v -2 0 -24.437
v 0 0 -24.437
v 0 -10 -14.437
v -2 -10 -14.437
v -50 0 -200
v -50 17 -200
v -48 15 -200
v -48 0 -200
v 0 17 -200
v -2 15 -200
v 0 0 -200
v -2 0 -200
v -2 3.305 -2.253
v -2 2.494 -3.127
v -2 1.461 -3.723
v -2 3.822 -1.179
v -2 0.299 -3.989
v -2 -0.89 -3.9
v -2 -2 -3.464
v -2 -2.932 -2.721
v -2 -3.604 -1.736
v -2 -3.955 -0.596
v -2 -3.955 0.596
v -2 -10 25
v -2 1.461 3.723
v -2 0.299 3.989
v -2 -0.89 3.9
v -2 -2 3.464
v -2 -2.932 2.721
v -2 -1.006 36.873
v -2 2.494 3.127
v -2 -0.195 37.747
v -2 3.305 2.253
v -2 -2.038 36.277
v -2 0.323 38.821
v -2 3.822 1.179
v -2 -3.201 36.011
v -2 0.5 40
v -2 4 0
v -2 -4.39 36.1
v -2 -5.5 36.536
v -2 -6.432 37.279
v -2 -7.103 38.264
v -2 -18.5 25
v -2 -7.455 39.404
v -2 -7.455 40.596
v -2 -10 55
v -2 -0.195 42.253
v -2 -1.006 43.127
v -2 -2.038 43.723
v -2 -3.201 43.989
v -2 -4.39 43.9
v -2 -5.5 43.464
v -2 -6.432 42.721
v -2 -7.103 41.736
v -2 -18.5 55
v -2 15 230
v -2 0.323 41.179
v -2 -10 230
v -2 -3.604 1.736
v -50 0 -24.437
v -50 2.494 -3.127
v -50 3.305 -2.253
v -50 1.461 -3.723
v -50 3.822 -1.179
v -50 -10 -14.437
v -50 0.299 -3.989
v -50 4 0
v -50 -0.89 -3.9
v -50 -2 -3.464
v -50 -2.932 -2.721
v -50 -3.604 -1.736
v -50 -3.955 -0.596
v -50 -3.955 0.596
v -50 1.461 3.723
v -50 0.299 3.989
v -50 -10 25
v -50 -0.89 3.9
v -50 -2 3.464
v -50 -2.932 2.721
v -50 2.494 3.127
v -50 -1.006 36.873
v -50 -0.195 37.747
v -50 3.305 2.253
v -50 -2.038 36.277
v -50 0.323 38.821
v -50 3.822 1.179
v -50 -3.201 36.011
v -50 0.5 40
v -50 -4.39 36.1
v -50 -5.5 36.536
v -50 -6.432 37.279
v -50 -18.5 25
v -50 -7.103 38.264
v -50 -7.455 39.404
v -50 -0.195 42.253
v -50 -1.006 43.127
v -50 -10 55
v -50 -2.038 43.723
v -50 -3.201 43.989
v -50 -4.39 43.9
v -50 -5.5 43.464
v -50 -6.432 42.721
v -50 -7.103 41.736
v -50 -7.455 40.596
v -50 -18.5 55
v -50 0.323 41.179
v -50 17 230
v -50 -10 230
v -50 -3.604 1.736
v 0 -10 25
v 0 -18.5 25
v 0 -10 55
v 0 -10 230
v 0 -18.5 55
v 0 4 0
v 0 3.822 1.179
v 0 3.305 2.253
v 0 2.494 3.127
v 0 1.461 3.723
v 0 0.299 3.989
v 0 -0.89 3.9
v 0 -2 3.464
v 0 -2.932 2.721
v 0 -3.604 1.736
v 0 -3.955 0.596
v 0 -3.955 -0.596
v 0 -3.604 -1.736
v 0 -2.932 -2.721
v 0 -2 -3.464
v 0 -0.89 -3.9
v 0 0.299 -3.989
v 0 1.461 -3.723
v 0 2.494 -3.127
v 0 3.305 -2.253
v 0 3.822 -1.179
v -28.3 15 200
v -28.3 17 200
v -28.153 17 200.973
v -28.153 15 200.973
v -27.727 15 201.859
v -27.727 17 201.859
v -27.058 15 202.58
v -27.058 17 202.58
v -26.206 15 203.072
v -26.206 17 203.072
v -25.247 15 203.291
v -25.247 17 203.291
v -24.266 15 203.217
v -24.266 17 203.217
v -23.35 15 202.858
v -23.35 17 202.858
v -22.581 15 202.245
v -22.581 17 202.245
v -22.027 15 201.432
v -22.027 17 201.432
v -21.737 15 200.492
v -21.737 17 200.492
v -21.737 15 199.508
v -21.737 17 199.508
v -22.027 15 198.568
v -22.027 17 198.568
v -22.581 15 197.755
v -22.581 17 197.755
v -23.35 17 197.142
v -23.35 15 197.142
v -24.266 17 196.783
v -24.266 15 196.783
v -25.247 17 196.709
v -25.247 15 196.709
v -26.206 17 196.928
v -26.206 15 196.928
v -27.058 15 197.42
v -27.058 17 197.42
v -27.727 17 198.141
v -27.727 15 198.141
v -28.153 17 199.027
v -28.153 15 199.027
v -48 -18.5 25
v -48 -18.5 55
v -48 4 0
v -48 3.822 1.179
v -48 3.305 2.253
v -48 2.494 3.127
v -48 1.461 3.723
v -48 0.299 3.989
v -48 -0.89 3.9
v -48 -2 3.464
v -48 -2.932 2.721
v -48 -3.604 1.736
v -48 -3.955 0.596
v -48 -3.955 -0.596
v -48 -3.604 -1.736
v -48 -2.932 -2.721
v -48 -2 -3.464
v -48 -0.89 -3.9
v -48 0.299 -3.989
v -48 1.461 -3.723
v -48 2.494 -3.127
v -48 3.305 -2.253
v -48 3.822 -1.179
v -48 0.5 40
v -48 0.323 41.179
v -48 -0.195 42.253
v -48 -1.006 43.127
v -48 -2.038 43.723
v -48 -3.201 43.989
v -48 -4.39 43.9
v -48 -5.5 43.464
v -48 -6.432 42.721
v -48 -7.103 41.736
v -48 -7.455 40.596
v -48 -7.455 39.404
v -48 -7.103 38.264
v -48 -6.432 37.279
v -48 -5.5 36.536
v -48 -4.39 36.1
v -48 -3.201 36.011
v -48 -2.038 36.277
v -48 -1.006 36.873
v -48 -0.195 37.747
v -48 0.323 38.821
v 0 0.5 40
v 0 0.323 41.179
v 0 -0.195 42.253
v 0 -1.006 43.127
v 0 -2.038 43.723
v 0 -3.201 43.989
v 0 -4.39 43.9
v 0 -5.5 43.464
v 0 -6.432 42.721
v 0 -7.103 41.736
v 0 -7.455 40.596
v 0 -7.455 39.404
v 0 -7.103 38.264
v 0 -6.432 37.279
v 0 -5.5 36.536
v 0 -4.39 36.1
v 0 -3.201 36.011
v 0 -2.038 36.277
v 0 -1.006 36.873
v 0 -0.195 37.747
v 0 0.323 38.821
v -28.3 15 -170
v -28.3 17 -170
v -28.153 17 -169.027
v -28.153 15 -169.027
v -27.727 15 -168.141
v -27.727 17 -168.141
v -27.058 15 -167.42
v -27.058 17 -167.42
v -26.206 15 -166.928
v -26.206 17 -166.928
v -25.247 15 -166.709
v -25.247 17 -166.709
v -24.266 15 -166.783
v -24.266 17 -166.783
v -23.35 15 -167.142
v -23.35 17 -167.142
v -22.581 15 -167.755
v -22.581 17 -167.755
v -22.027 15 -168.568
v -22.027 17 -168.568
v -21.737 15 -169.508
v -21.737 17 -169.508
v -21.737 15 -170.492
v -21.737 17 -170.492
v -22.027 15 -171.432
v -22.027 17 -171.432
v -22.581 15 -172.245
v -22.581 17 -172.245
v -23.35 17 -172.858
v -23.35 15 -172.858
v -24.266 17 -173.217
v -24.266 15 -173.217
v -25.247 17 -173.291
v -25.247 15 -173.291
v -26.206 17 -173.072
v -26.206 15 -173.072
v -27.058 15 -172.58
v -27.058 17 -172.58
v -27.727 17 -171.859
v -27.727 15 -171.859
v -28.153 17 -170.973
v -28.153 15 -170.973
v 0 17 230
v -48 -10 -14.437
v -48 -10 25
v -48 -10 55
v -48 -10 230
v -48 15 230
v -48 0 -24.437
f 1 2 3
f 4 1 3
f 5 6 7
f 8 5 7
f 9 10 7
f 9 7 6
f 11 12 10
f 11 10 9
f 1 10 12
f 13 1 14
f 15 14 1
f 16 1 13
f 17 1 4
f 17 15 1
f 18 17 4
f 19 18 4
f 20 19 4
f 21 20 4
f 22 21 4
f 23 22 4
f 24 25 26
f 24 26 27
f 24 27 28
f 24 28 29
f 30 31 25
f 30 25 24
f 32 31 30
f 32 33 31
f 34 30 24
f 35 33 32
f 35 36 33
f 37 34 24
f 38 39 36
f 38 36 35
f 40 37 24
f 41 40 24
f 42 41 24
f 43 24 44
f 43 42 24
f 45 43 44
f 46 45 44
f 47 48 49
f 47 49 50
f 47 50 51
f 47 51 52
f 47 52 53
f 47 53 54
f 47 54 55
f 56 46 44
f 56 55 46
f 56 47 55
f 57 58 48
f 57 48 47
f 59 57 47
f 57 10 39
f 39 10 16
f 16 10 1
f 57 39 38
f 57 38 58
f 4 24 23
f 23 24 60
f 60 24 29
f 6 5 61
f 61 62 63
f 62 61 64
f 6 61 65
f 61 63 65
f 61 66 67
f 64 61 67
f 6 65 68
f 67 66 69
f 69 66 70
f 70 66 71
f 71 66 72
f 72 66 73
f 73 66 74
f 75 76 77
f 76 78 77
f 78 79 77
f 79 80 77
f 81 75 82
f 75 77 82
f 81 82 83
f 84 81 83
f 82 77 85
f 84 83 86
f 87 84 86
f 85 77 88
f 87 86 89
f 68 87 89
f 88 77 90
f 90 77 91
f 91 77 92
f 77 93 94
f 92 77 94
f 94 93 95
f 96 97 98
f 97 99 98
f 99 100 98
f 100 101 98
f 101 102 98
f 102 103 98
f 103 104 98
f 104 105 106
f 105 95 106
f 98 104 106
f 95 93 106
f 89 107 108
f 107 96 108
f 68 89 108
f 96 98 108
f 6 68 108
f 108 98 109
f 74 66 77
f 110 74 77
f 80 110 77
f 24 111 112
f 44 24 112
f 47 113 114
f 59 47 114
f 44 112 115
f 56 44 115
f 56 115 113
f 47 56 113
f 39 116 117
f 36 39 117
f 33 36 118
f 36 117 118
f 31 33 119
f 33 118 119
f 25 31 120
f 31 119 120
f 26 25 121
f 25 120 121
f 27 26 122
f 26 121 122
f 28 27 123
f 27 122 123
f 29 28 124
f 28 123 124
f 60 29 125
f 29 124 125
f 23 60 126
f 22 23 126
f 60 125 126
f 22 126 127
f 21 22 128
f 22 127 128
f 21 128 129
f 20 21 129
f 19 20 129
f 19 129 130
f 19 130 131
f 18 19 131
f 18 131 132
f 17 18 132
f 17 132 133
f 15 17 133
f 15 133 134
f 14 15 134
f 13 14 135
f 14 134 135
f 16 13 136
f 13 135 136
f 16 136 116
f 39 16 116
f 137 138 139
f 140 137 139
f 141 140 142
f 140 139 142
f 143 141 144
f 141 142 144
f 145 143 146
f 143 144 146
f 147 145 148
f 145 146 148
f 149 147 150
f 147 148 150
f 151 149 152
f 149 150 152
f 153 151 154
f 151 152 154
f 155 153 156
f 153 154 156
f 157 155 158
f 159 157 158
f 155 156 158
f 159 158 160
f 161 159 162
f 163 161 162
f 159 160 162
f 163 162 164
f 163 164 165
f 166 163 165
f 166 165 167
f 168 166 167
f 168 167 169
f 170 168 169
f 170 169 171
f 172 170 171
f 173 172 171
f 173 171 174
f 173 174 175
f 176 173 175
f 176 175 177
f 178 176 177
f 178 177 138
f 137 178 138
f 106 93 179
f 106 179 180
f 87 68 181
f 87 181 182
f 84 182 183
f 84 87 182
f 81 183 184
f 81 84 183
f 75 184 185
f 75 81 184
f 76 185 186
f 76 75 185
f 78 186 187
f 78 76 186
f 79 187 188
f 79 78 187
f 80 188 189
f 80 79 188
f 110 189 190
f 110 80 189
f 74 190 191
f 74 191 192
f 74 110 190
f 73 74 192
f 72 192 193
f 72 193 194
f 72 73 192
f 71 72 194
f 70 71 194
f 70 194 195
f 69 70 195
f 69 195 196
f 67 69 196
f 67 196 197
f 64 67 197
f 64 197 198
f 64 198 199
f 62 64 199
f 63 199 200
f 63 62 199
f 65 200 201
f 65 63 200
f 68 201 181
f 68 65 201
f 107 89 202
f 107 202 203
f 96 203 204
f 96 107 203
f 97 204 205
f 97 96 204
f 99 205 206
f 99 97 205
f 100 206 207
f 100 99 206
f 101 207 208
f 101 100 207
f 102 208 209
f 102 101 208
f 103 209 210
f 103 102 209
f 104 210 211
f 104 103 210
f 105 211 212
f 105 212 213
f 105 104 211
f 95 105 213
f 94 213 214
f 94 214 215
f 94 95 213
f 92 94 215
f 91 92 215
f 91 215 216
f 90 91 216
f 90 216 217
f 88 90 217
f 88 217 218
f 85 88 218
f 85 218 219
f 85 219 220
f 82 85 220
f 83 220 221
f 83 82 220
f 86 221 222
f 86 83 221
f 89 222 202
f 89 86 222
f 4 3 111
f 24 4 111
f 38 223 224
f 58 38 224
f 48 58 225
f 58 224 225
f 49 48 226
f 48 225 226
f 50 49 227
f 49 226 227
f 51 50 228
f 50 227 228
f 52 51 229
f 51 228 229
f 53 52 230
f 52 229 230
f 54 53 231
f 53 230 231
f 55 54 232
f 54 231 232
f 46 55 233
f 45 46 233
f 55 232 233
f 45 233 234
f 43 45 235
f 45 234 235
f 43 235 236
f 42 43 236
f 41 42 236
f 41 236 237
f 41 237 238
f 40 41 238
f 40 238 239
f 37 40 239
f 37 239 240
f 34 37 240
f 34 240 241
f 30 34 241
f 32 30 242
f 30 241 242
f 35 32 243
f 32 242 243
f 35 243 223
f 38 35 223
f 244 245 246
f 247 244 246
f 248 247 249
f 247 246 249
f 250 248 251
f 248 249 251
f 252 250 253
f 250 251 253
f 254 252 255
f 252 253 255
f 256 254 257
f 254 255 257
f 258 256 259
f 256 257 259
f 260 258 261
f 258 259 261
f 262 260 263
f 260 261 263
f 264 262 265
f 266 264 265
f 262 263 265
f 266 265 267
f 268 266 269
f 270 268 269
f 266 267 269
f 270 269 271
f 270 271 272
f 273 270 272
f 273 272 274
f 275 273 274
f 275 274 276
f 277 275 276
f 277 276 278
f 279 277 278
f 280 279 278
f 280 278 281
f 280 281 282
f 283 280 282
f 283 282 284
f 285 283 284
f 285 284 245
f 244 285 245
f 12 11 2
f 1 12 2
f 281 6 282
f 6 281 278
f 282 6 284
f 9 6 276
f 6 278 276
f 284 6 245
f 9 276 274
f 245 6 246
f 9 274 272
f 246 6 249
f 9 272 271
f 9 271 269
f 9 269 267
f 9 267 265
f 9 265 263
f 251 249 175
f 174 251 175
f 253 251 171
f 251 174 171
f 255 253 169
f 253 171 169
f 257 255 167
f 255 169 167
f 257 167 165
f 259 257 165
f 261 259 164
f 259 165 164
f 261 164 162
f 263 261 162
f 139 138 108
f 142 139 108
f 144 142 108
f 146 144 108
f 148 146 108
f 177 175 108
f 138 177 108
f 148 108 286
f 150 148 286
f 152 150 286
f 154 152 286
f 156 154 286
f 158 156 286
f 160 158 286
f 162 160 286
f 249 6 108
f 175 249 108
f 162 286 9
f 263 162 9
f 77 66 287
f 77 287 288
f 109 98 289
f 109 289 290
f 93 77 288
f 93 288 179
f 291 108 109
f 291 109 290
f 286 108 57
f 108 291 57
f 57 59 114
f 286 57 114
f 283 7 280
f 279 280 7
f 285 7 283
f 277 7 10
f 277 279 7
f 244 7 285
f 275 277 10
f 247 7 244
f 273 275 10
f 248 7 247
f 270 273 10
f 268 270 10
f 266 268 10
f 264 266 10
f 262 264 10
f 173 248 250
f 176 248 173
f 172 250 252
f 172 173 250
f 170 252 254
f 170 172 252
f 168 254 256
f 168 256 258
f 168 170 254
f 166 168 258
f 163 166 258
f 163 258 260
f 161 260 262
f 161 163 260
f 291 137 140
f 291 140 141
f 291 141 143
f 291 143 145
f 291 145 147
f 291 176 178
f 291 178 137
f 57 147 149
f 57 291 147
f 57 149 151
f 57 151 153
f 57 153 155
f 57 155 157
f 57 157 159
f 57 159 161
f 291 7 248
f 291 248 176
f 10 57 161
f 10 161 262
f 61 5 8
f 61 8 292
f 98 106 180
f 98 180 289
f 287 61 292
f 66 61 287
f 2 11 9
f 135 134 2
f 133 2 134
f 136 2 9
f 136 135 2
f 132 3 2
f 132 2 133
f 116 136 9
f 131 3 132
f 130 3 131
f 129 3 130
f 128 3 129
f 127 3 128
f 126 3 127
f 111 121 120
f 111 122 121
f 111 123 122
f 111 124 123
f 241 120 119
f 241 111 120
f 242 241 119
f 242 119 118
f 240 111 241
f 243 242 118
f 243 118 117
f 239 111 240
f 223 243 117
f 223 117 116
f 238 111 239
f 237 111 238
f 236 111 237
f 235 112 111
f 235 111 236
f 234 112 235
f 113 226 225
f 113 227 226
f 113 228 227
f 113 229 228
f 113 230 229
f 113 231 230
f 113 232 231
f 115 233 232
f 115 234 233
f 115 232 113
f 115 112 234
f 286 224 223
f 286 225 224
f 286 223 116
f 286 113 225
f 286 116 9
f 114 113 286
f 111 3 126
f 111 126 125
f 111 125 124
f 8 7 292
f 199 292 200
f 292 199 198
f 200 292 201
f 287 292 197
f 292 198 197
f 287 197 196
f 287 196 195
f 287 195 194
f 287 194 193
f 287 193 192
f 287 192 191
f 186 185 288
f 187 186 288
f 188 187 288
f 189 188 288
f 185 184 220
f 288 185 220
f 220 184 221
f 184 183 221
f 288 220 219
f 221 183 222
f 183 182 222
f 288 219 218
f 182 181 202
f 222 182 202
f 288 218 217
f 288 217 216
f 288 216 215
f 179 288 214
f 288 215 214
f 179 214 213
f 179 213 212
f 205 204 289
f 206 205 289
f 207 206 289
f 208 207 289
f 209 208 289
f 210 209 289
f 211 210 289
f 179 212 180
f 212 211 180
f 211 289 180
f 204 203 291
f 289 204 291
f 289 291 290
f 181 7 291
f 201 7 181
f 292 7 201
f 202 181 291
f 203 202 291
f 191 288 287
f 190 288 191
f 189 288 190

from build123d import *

# Parameters (mm, degrees)
SKETCH1_R               = 4
BOSS_EXTRUDE1_DEPTH     = 2
SKETCH2_W               = 25
SKETCH2_H               = 430
BOSS_EXTRUDE2_DEPTH     = 2
SKETCH3_R               = 3.3
CUT_EXTRUDE1_DEPTH      = 1
CUT_EXTRUDE1_DEPTH_BACK = 36.499546541


with BuildPart() as part:
    # Sketch1 → Boss-Extrude1 (new body)
    with BuildSketch(Plane.YZ):
        Polygon((15, 230), (15, -200), (0, -200), (0, -24.43744304), (-10, -14.43744304), (-10, 25), (-18.499546541, 25), (-18.499546541, 55), (-10, 55), (-10, 230), align=None)
        Circle(SKETCH1_R, mode=Mode.SUBTRACT)
        with Locations((-3.499546541, 40)):
            Circle(SKETCH1_R, mode=Mode.SUBTRACT)
    extrude(amount=-BOSS_EXTRUDE1_DEPTH)

    # Sketch2 → Boss-Extrude2 (add)
    with BuildSketch(Plane(origin=(0, 15, 0), x_dir=(-1, 0, 0), z_dir=(0, 1, 0))):
        with Locations((12.5, 15)):
            Rectangle(SKETCH2_W, SKETCH2_H)
    extrude(amount=BOSS_EXTRUDE2_DEPTH)

    # Mirror1: part across plane


with BuildPart() as part_1:
    add(part.part)
    add(part.part.mirror(Plane(origin=(-25, 17, 230), x_dir=(0, 0, 1), z_dir=(1, 0, 0))))

    # Sketch3 → Cut-Extrude1 (cut, two sides)
    with BuildSketch(Plane(origin=(0, 17, 0), x_dir=(-1, 0, 0), z_dir=(0, 1, 0))) as cut_extrude1_sk:
        with Locations((25, 200)):
            Circle(SKETCH3_R)
        with Locations((25, -170)):
            Circle(SKETCH3_R)
    extrude(amount=CUT_EXTRUDE1_DEPTH, mode=Mode.SUBTRACT)
    extrude(cut_extrude1_sk.sketch, amount=-CUT_EXTRUDE1_DEPTH_BACK, mode=Mode.SUBTRACT)


solid = part_1.part
